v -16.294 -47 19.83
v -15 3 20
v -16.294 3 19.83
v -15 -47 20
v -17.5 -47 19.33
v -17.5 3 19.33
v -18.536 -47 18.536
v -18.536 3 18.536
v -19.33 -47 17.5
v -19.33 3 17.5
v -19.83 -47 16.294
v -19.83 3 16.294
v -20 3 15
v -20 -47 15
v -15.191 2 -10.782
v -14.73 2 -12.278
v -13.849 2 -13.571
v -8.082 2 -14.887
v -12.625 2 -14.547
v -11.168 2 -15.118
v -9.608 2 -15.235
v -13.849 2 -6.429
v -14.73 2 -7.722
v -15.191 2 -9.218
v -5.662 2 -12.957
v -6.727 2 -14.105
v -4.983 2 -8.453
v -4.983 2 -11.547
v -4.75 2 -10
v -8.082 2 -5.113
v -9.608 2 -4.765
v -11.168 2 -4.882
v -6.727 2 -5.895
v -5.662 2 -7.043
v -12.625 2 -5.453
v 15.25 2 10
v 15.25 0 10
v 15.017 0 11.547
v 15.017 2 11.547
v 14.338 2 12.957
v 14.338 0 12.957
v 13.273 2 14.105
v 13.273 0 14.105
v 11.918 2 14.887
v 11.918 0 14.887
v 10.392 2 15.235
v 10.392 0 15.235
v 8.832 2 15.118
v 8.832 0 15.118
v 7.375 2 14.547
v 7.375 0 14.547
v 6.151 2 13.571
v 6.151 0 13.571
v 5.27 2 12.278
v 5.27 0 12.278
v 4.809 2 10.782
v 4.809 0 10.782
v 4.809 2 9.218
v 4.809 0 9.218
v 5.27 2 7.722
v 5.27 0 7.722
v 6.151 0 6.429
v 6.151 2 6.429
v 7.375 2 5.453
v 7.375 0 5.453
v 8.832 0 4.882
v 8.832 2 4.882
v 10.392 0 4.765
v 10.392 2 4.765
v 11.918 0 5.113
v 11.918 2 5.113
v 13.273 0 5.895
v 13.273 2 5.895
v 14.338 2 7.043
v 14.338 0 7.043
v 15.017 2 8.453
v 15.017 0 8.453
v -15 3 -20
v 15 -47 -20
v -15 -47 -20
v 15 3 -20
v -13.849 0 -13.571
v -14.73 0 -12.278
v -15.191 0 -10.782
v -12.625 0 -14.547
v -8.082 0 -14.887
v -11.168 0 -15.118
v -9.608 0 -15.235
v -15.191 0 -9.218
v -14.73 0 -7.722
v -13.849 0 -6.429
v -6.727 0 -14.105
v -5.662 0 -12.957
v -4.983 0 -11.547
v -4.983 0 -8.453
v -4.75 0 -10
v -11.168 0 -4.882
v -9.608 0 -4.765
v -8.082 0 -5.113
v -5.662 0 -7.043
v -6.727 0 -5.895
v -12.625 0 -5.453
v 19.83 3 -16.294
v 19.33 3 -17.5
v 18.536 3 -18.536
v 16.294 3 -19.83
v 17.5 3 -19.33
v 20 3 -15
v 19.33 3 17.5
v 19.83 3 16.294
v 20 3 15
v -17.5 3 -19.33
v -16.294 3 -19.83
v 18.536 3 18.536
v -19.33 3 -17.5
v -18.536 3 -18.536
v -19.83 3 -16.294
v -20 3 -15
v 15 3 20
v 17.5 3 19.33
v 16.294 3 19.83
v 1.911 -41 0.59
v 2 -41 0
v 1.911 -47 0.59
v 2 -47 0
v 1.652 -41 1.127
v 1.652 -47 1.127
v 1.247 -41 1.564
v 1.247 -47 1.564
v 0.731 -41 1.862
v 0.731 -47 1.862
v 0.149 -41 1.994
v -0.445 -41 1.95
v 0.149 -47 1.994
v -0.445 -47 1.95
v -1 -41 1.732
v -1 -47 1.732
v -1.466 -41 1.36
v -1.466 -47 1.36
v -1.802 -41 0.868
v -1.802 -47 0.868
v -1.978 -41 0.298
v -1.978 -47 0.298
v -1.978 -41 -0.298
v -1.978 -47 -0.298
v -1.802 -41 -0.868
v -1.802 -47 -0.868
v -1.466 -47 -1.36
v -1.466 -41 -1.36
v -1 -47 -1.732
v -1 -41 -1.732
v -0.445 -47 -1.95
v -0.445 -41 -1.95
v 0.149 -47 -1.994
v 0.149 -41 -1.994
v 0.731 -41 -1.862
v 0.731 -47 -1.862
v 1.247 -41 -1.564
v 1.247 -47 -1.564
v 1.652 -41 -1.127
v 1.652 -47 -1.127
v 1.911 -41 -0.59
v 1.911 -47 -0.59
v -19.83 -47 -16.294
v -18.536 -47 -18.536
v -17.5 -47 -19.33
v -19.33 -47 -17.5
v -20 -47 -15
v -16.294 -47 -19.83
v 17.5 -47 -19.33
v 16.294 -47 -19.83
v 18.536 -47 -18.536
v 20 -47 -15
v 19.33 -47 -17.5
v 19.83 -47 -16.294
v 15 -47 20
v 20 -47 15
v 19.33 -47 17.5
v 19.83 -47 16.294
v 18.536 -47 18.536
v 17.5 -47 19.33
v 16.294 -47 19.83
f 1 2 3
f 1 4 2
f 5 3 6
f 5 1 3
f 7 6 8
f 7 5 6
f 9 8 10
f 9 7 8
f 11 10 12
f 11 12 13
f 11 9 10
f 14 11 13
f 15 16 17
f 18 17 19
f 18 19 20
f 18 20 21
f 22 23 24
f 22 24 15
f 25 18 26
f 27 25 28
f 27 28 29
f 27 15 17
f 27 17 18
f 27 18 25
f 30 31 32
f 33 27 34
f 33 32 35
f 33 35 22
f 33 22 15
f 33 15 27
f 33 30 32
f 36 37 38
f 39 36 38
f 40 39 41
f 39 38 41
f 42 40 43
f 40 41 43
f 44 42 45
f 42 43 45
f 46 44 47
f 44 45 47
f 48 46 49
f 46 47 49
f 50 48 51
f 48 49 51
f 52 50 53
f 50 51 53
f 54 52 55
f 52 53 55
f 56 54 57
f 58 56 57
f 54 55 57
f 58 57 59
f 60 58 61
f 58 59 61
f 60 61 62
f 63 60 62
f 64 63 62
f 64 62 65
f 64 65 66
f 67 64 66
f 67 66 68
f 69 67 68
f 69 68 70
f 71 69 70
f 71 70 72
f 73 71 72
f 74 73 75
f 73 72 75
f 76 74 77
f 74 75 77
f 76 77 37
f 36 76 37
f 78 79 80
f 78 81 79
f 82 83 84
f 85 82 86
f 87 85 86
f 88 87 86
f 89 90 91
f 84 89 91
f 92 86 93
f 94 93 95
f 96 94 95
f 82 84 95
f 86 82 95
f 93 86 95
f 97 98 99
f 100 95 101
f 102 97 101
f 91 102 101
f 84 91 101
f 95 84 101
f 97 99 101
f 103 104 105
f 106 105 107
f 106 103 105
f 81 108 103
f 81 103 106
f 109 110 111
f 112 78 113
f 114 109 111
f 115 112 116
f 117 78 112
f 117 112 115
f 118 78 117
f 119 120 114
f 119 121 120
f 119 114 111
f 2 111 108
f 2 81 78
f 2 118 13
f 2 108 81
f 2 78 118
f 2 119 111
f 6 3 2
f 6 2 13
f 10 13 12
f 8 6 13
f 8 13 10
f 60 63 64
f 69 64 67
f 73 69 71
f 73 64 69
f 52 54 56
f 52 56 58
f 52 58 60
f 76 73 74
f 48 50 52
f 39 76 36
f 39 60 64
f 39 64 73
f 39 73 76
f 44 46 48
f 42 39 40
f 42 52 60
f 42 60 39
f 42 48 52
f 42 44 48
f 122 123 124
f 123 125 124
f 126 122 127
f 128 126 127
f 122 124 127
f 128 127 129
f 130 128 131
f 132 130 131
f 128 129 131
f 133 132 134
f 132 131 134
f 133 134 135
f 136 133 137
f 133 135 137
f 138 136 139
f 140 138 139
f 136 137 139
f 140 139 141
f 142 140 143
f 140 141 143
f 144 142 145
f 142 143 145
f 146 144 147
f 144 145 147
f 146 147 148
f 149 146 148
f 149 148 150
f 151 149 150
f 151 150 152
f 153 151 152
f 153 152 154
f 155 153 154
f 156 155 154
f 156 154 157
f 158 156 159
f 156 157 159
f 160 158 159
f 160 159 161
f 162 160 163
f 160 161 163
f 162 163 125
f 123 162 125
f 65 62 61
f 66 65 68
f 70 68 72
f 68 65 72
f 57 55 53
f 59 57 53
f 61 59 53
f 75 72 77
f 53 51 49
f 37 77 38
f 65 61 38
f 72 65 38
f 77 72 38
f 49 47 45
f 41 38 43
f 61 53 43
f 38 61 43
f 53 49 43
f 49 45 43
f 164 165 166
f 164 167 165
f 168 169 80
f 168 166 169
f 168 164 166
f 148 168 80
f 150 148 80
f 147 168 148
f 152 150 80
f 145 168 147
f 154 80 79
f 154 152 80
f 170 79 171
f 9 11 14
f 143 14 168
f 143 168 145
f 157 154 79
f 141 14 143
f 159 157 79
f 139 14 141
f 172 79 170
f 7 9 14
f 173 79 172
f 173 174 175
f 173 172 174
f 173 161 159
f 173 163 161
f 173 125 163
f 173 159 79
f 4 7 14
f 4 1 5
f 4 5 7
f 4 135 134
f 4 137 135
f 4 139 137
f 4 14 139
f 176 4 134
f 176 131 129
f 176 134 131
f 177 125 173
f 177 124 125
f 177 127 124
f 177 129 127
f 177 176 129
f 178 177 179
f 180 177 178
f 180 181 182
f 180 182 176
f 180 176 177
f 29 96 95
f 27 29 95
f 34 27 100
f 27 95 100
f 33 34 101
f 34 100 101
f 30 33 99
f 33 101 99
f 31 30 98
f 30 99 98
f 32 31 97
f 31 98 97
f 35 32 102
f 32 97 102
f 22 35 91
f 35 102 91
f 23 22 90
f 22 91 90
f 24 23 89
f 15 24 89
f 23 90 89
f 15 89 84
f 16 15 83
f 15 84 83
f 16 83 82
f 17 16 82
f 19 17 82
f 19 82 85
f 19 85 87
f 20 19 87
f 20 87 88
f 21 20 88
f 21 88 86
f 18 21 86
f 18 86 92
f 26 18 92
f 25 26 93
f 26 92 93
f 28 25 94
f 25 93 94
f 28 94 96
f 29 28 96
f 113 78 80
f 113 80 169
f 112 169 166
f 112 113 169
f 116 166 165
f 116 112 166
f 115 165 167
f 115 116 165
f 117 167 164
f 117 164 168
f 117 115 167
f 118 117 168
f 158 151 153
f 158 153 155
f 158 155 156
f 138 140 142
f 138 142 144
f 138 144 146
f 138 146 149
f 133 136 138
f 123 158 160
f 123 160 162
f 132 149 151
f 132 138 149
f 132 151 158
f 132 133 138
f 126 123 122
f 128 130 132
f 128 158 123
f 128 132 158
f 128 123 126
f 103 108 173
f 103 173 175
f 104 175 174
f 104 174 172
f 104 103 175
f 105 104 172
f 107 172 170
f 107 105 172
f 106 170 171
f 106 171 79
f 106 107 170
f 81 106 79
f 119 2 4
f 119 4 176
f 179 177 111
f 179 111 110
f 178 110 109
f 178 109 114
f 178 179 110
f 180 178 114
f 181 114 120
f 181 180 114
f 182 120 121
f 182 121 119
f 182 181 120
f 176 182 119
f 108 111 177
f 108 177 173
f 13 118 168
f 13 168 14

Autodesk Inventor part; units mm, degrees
ref_plane "YZ Plane" through (0, 0, 0) normal (1, 0, 0) x (0, 1, 0)
ref_plane "XZ Plane" through (0, 0, 0) normal (0, 1, 0) x (-1, 0, 0)
ref_plane "XY Plane" through (0, 0, 0) normal (0, 0, 1) x (1, 0, 0)
sketch "Skizze1" plane through (0, 0, 0) normal (0, 1, 0) x (-1, 0, 0)
  line L0 (-20, 20) -> (20, 20)
  line L1 (20, 20) -> (20, -20)
  line L2 (20, -20) -> (-20, -20)
  line L3 (-20, -20) -> (-20, 20)
  line L4 (-20, 20) -> (20, -20) construction
  line L5 (20, 20) -> (-20, -20) construction
  line L6 (20, 20) -> (0, 20) construction
  line L7 (0, 20) -> (0, 0) construction
  line L8 (0, 0) -> (20, 0) construction
  line L9 (20, 0) -> (20, 20) construction
  line L10 (0, 0) -> (-20, 0) construction
  line L11 (-20, 0) -> (-20, -20) construction
  line L12 (-20, -20) -> (0, -20) construction
  line L13 (0, -20) -> (0, 0) construction
  point P0 (10, 10)
  point P1 (-10, -10)
  dimension "d0" = 40
  dimension "d1" = 40
extrude "Extrusion1" add sketch "Skizze1" along normal blind 3
sketch "Skizze2" plane through (0, 0, 0) normal (0, -1, 0) x (1, 0, 0)
  line L0 (20, -20) -> (-20, -20) construction
  line L1 (20, 20) -> (20, -20) construction
  line L2 (-20, 20) -> (20, 20) construction
  line L3 (-20, -20) -> (-20, 20) construction
  line L4 (20, 20) -> (0, 20) construction
  line L5 (0, 20) -> (0, 0) construction
  line L6 (0, 0) -> (20, 0) construction
  line L7 (20, 0) -> (20, 20) construction
  line L8 (-20, -20) -> (0, -20) construction
  line L9 (0, -20) -> (0, 0) construction
  line L10 (0, 0) -> (-20, 0) construction
  line L11 (-20, 0) -> (-20, -20) construction
  circle A0 centre (10, 10) radius 5.25
  circle A1 centre (-10, -10) radius 5.25
  dimension "d4" = 10.5
  dimension "d5" = 10.5
extrude "Extrusion2" cut sketch "Skizze2" against normal blind 2
sketch "Skizze4" plane through (0, 0, 0) normal (0, -1, 0) x (1, 0, 0)
  line L0 (20, 20) -> (20, -20) projected
  line L1 (-20, -20) -> (-20, 20) projected
  line L2 (-20, 20) -> (20, 20) projected
  line L3 (20, -20) -> (-20, -20) projected
  line L4 (20, 20) -> (-20, 20)
  line L5 (-20, 20) -> (-20, -20)
  line L6 (-20, -20) -> (20, -20)
  line L7 (20, -20) -> (20, 20)
  point P0 (0, 0)
extrude "Extrusion3" add sketch "Skizze4" along normal blind 47
sketch "Sketch6" plane through (0, -47, 0) normal (0, -1, 0) x (1, 0, 0)
  circle A0 centre (0, 0) radius 2
  dimension "d20" = 4
extrude "Extrusion4" cut sketch "Sketch6" against normal blind 6
fillet "Fillet1" radius 5 4 edges at (-20, -22, 20) (-20, -22, -20) (20, -22, -20) (20, -22, 20)
ref_plane "Arbeitsebene2" through (-18.5355, -47, -18.5355) normal (-0.7071, 0, 0.7071) x (0.7071, 0, 0.7071)
properties part number "Stützblöcke"
